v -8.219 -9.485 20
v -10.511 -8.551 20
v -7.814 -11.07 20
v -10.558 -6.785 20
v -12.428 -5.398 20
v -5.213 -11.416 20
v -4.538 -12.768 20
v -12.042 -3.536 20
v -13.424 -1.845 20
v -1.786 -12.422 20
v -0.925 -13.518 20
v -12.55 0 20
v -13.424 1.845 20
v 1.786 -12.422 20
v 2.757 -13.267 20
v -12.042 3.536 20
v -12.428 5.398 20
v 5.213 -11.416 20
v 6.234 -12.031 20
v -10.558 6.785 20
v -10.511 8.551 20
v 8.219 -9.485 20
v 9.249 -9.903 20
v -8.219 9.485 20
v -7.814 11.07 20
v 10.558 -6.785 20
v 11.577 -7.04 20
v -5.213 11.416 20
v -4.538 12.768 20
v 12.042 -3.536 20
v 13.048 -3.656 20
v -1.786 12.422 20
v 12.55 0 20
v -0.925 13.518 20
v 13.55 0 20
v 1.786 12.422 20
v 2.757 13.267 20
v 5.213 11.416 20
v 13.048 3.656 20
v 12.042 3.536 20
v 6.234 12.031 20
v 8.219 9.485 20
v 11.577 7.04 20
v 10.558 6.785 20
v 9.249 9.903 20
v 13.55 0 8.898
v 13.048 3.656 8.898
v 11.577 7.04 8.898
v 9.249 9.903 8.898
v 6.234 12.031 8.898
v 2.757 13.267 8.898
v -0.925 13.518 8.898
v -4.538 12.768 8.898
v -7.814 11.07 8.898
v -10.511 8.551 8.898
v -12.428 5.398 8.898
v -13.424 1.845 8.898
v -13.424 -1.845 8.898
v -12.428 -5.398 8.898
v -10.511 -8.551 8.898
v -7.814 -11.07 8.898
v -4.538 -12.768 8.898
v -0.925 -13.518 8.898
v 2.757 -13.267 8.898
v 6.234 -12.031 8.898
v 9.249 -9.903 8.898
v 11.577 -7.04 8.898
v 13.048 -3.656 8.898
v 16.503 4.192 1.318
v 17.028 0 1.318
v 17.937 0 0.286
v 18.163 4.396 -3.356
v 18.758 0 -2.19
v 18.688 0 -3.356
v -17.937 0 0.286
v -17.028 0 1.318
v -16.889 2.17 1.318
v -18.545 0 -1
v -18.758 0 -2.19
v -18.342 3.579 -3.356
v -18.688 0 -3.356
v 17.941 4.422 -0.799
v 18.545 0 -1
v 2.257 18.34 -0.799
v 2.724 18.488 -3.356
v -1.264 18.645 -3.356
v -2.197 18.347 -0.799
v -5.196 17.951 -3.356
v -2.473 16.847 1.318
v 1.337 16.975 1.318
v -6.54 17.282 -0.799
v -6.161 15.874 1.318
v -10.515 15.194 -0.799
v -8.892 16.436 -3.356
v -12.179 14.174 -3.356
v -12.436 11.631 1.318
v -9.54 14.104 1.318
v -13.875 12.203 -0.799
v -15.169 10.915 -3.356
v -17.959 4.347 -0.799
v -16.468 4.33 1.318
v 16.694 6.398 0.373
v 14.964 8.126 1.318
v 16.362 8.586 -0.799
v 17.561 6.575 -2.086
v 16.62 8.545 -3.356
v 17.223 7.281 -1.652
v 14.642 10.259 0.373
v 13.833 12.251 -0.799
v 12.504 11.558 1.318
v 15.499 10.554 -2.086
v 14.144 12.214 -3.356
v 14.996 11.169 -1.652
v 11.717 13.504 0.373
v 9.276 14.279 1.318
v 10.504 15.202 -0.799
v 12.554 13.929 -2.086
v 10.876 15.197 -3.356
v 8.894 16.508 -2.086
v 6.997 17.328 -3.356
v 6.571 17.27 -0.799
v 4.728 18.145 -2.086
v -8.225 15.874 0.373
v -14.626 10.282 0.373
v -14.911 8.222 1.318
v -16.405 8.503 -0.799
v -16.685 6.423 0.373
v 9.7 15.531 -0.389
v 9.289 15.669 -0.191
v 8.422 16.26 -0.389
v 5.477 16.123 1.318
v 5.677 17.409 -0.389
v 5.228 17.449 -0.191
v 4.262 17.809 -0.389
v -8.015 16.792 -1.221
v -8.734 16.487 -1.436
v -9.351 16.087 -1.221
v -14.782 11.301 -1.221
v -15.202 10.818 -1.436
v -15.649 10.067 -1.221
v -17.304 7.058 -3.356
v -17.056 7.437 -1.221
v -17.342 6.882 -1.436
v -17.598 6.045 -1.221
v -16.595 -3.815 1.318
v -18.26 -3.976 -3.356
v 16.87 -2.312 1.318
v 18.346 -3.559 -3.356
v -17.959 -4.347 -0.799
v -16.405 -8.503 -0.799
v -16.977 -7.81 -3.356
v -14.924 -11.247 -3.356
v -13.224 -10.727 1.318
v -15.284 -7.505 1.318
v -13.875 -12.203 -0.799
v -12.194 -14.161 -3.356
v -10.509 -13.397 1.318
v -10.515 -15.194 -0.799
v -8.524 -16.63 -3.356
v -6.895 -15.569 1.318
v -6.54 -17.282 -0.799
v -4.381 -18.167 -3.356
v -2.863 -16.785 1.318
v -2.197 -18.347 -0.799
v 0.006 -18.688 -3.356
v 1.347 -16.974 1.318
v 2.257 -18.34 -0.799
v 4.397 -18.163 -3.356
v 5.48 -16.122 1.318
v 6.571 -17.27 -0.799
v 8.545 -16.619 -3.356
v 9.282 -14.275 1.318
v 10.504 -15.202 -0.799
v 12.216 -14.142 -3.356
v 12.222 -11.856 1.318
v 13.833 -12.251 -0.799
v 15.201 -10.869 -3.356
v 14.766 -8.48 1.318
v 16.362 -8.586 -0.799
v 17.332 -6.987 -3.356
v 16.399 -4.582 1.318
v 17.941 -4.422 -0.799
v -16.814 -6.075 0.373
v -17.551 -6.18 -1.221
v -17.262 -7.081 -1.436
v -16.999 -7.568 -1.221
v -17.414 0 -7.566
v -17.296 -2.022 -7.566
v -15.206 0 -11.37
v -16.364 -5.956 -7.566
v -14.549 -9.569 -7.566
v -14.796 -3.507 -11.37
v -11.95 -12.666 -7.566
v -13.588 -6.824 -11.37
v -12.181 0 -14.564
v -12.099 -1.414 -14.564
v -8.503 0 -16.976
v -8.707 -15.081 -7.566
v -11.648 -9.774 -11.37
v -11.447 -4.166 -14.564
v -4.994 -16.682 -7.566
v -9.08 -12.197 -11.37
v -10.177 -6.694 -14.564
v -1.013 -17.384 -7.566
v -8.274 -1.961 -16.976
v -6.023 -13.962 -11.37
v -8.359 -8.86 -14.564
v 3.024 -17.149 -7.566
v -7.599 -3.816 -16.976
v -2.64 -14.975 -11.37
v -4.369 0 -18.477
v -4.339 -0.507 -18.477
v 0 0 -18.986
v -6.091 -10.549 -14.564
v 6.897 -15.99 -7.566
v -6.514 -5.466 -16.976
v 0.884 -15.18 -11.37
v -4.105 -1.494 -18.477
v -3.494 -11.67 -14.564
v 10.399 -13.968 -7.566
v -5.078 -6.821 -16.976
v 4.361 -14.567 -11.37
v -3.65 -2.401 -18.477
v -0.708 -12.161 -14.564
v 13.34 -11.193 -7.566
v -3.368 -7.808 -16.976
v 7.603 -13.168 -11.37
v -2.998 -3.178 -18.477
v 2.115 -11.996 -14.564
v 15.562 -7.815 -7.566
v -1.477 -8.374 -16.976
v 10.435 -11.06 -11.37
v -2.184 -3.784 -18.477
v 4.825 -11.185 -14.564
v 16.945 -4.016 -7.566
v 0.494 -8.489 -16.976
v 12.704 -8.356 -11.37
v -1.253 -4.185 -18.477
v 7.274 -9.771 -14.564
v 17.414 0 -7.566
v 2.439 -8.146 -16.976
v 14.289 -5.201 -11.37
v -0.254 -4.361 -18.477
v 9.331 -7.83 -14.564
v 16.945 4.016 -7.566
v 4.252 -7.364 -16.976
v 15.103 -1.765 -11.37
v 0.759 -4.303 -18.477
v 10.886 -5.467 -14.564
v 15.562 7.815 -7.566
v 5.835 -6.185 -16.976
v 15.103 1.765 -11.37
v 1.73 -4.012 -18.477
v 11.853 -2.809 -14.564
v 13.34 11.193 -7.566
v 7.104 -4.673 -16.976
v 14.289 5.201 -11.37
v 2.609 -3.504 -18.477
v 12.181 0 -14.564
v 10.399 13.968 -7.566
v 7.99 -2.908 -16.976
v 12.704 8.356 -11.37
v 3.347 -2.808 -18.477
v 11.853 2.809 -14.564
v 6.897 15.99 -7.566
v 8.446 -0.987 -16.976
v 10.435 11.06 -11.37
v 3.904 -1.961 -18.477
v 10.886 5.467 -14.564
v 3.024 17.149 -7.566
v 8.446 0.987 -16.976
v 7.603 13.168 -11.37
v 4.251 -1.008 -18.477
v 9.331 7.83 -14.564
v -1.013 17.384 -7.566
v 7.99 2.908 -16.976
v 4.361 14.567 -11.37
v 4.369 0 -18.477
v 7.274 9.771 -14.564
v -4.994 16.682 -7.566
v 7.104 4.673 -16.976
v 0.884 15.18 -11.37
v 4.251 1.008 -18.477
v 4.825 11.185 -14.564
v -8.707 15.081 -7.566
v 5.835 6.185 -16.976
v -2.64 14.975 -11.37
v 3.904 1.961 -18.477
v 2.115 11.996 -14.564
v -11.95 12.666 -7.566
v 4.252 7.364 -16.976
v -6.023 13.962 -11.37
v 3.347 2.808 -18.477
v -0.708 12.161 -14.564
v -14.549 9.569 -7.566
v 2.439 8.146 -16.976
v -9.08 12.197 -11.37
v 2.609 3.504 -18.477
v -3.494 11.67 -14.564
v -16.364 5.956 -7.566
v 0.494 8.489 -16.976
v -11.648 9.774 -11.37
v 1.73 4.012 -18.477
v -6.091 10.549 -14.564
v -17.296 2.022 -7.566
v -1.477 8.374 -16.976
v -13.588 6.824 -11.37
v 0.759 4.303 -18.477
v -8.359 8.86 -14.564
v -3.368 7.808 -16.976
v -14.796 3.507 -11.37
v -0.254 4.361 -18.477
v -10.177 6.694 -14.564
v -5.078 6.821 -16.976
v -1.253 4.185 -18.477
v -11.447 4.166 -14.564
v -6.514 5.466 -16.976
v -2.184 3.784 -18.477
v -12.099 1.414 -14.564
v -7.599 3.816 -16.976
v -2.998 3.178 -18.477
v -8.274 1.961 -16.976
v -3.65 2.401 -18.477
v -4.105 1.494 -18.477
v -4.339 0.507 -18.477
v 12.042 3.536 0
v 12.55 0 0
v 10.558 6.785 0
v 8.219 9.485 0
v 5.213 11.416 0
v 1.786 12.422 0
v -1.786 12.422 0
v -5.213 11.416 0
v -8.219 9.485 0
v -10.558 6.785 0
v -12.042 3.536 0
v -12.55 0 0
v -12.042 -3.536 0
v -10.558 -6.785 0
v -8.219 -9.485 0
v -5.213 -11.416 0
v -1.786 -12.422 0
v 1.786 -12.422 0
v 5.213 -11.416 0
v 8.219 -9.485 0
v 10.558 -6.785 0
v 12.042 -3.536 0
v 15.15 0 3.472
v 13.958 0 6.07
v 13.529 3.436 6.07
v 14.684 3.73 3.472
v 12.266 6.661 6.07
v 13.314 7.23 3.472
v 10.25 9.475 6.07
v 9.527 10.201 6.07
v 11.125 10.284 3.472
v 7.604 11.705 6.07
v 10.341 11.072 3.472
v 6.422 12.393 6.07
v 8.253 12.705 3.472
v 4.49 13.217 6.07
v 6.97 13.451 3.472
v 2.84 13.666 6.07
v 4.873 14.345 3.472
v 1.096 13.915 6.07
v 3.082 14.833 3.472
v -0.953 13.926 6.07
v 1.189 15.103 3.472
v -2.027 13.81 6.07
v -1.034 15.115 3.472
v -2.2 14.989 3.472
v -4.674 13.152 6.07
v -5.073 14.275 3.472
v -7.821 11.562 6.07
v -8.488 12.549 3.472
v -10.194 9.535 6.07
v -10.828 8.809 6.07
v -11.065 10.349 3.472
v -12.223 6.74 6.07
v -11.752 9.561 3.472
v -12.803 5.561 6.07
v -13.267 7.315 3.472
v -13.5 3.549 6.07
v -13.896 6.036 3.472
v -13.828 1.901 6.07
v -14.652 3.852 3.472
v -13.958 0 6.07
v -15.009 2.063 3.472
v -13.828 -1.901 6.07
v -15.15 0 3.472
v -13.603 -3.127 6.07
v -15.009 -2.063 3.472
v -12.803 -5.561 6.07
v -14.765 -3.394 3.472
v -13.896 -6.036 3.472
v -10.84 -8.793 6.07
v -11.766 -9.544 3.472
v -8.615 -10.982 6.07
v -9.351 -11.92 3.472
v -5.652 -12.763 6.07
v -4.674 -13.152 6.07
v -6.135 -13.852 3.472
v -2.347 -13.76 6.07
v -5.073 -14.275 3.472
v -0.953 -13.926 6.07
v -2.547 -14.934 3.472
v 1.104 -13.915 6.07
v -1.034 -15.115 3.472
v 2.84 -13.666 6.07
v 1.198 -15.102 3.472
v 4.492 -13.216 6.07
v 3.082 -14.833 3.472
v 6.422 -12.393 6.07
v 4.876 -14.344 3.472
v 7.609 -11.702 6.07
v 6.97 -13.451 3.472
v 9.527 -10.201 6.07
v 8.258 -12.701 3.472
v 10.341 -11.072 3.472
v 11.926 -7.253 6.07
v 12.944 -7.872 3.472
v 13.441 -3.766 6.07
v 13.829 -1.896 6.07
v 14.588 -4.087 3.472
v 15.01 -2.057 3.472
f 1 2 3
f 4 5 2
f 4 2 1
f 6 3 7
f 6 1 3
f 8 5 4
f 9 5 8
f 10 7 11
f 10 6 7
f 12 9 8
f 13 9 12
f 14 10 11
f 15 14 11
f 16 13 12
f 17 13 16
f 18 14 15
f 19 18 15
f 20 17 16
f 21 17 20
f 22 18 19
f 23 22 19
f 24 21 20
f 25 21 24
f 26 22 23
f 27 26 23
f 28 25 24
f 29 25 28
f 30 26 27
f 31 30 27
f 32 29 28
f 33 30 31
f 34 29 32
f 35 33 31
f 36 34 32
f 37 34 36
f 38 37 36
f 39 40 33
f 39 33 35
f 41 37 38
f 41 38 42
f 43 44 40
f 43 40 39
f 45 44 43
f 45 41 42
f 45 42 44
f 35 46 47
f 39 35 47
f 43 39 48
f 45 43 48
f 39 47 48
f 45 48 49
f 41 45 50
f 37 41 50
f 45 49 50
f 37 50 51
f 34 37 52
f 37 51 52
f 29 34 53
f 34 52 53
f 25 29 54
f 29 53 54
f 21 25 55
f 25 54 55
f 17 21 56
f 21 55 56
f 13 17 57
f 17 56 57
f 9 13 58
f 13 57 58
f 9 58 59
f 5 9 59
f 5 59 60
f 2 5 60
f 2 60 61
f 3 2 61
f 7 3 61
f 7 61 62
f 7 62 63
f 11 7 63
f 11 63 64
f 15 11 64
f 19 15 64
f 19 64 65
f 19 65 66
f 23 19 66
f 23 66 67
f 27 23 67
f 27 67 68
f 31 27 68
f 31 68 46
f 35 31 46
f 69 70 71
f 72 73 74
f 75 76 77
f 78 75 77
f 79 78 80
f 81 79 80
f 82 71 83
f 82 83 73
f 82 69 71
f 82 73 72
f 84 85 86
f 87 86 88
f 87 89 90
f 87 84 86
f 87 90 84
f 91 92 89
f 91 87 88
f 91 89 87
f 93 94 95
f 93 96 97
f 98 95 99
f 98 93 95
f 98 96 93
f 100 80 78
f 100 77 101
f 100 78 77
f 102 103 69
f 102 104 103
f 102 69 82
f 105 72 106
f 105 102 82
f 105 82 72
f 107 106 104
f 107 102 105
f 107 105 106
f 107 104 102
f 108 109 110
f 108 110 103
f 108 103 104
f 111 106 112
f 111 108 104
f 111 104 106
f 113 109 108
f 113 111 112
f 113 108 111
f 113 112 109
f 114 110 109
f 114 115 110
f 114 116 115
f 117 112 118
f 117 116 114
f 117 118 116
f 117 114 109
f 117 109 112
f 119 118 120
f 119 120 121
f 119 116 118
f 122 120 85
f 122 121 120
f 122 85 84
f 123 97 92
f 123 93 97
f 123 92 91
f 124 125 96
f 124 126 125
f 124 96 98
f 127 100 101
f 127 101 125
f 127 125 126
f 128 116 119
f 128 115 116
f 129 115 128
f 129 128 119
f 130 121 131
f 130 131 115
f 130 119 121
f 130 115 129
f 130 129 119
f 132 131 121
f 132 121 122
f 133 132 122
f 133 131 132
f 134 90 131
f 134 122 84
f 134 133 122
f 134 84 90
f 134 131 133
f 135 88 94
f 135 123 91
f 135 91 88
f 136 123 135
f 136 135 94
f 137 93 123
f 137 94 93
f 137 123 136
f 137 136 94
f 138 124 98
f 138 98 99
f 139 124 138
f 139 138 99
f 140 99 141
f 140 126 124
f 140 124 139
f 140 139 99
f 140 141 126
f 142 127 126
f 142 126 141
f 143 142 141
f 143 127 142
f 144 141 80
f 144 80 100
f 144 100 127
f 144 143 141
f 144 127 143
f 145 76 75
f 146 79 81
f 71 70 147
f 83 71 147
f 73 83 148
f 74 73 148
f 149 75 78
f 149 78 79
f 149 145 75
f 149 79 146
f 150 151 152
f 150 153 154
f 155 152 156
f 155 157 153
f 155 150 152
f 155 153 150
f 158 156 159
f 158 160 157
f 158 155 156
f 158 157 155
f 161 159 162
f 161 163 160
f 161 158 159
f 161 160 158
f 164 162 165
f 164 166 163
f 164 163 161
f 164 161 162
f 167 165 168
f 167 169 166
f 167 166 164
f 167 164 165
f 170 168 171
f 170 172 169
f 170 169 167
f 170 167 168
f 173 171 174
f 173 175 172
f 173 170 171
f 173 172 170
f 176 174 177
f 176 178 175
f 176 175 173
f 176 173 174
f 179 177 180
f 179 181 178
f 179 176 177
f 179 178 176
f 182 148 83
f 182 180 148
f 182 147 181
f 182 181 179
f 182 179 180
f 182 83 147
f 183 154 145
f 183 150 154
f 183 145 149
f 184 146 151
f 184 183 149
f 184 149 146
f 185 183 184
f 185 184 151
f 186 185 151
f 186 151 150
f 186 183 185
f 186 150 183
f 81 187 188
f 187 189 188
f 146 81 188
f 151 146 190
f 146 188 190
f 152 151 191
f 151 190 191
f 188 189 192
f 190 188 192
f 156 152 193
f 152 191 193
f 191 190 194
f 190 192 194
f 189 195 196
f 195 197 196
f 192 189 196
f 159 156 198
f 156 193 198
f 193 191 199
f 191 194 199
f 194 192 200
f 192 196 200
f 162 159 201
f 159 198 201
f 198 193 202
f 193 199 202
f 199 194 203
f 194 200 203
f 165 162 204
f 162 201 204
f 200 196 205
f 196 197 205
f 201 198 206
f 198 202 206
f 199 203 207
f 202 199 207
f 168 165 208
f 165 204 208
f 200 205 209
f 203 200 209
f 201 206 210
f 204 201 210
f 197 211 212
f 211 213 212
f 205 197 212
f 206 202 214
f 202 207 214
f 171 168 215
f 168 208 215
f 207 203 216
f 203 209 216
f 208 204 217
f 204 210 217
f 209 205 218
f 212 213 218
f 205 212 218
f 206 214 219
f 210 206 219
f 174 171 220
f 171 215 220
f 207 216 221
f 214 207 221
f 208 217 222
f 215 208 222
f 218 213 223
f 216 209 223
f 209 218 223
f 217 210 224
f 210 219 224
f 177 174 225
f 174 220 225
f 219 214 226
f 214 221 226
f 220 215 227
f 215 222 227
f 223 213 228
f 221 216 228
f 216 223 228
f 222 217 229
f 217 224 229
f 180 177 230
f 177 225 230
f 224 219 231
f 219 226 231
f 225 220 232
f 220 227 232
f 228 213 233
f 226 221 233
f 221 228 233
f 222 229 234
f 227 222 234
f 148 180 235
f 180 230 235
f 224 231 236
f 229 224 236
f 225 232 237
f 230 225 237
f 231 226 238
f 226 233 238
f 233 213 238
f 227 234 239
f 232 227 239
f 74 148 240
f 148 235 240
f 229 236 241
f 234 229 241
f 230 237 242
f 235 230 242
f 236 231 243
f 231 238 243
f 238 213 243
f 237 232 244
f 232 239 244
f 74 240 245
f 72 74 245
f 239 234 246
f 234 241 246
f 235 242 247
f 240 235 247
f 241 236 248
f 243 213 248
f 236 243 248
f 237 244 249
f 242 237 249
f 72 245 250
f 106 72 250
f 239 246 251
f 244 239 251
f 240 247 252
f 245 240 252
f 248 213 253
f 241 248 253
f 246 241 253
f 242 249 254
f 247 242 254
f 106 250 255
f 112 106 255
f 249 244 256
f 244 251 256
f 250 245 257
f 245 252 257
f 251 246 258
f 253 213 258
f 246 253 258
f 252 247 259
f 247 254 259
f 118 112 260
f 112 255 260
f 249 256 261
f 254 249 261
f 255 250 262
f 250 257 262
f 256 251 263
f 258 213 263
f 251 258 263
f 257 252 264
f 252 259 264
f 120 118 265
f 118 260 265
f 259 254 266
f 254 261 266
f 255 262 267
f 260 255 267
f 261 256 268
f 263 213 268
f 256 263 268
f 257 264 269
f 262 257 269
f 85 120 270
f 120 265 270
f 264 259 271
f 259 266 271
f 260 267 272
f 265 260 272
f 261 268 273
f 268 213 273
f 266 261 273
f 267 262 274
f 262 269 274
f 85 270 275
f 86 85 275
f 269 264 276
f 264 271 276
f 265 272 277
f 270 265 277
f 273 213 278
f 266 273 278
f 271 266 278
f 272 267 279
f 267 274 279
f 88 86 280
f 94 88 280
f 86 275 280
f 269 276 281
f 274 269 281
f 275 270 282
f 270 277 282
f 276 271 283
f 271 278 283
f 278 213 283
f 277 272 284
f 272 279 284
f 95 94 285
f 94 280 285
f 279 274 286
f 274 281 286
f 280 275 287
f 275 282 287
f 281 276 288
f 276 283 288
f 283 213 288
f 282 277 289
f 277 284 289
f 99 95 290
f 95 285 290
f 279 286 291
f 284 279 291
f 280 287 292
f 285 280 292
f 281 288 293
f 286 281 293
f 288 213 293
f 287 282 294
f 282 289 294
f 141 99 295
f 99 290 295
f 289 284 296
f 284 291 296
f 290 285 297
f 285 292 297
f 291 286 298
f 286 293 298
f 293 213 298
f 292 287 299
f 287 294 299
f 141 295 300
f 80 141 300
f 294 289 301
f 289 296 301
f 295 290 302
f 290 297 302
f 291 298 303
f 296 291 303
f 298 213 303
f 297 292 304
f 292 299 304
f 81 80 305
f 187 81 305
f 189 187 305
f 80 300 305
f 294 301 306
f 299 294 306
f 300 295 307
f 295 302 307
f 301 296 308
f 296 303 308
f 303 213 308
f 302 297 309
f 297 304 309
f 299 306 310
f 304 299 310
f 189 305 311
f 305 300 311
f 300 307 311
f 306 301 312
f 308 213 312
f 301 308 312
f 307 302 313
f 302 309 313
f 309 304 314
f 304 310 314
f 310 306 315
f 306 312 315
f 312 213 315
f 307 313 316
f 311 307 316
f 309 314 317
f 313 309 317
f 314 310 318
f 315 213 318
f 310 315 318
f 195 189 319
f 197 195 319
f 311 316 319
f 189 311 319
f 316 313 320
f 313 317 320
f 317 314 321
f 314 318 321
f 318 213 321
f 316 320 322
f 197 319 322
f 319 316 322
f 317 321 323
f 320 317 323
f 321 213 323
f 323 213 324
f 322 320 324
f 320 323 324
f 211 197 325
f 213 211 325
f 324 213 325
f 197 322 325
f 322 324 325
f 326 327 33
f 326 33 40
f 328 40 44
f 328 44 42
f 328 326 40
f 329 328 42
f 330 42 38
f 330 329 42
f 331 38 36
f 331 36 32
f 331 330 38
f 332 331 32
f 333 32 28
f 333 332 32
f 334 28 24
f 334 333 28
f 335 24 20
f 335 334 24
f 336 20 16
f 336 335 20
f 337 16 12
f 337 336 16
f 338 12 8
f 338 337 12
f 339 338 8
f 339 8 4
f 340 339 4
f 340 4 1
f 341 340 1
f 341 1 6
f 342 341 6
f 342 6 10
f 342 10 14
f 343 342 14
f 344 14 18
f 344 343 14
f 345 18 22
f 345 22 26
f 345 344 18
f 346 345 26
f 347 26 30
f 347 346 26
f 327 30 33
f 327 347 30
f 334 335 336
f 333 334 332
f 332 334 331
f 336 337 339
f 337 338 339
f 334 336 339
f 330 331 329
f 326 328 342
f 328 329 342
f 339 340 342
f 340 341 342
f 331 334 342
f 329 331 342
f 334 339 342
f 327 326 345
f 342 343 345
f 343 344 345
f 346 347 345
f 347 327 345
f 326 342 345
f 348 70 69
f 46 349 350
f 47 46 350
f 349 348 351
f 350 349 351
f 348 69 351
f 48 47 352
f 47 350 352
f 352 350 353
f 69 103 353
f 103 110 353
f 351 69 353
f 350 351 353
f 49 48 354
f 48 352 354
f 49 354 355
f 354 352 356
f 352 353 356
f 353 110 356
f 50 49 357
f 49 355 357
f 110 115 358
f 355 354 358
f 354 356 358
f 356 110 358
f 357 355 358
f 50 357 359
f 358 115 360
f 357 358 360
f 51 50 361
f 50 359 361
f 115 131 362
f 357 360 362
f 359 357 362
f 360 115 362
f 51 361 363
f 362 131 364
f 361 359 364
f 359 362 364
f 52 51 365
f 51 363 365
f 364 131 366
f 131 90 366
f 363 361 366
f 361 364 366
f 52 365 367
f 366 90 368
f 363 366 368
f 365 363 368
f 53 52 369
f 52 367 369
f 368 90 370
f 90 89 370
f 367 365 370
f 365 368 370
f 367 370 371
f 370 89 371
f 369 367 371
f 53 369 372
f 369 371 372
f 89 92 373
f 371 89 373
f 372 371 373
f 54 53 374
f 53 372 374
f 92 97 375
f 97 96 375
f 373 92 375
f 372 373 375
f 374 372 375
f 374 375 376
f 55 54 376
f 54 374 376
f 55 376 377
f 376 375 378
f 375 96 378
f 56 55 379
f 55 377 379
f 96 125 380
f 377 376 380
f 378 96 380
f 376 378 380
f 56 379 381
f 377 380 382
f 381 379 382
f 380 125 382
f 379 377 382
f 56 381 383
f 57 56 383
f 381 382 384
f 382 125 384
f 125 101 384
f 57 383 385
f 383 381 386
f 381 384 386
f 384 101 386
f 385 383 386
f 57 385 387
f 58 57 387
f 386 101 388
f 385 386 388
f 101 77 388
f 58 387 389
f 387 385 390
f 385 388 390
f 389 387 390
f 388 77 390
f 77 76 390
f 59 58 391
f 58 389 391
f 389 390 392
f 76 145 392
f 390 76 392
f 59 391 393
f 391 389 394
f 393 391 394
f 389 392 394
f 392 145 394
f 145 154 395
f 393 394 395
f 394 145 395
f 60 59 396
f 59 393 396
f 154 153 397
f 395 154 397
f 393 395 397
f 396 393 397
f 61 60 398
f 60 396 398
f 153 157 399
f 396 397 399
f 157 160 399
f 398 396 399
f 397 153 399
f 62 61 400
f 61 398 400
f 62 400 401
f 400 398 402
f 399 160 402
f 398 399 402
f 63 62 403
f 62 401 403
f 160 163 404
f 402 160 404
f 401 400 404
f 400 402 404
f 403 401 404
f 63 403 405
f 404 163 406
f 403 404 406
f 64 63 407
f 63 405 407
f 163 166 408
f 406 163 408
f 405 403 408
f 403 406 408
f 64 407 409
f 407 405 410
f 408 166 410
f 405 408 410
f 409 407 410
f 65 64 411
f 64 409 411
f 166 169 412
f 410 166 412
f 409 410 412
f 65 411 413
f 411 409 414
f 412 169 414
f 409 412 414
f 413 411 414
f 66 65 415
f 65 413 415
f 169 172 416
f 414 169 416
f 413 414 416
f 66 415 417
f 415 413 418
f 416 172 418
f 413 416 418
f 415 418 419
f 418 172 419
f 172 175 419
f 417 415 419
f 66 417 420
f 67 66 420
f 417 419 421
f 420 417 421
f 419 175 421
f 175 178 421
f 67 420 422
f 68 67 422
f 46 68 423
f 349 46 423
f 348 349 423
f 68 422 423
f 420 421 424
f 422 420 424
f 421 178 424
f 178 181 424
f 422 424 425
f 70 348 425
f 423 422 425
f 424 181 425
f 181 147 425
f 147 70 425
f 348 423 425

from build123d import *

# Parameters (mm, degrees)
ESQUISSE1_R        = 13.55
ESQUISSE1_R_2      = 12.55
BOSS_EXTRU_1_DEPTH = 20
CONG_1_R           = 10
CONG_2_R           = 5


with BuildPart() as part:
    # Esquisse1 → Boss.-Extru.1 (new body)
    with BuildSketch(Plane.XY):
        Circle(ESQUISSE1_R)
        Circle(ESQUISSE1_R_2, mode=Mode.SUBTRACT)
    extrude(amount=BOSS_EXTRU_1_DEPTH)

    # Esquisse2 → Révolution1 (revolve)
    with BuildSketch(Plane(origin=(0, 0, 0), x_dir=(0, 0, -1), z_dir=(1, 0, 0)), mode=Mode.PRIVATE) as r_volution1_sk:
        with BuildLine():
            Line((18.986494144, 0), (0, 0))
            Line((0, 0), (0, -18.986494144))
            ThreePointArc((0, -18.986494144), (13.42547876, -13.42547876), (18.986494144, 0))
        make_face()
    revolve(r_volution1_sk.sketch.rotate(Axis((0, 0, -18.986494144), (0, 0, 1)), 270), axis=Axis((0, 0, -18.986494144), (0, 0, 1)))

    # Congé1
    # the kernel refuses this fillet: 10 mm, written as the material it adds along each edge
    with BuildSketch(Plane(origin=(0, 0, 0), x_dir=(1, 0, 0), z_dir=(0, -1, 0))) as cong_1_piece_1:
        with BuildLine():
            CenterArc((23.55, 8.898000579), CONG_1_R, 180, 62.848132995)
            Line((13.55, 8.898000579), (13.35, 8.898000579))
            Line((13.35, 8.898000579), (13.35, 0))
            Line((13.35, 0), (13.55, -0.2))
            ThreePointArc((13.55, -0.2), (16.268247072, -0.2), (18.895224027, -0.177960012))
            Line((18.895224027, -0.177960012), (18.986494144, 0))
        make_face()
    revolve(axis=Axis((0, 0, 0), (0, 0, 1)))

    # Congé2
    cong_2_edges = [part.edges().sort_by_distance(p)[0] for p in [
        (0, 18.986494144, 0),
    ]]
    fillet(cong_2_edges, radius=CONG_2_R)


solid = part.part
